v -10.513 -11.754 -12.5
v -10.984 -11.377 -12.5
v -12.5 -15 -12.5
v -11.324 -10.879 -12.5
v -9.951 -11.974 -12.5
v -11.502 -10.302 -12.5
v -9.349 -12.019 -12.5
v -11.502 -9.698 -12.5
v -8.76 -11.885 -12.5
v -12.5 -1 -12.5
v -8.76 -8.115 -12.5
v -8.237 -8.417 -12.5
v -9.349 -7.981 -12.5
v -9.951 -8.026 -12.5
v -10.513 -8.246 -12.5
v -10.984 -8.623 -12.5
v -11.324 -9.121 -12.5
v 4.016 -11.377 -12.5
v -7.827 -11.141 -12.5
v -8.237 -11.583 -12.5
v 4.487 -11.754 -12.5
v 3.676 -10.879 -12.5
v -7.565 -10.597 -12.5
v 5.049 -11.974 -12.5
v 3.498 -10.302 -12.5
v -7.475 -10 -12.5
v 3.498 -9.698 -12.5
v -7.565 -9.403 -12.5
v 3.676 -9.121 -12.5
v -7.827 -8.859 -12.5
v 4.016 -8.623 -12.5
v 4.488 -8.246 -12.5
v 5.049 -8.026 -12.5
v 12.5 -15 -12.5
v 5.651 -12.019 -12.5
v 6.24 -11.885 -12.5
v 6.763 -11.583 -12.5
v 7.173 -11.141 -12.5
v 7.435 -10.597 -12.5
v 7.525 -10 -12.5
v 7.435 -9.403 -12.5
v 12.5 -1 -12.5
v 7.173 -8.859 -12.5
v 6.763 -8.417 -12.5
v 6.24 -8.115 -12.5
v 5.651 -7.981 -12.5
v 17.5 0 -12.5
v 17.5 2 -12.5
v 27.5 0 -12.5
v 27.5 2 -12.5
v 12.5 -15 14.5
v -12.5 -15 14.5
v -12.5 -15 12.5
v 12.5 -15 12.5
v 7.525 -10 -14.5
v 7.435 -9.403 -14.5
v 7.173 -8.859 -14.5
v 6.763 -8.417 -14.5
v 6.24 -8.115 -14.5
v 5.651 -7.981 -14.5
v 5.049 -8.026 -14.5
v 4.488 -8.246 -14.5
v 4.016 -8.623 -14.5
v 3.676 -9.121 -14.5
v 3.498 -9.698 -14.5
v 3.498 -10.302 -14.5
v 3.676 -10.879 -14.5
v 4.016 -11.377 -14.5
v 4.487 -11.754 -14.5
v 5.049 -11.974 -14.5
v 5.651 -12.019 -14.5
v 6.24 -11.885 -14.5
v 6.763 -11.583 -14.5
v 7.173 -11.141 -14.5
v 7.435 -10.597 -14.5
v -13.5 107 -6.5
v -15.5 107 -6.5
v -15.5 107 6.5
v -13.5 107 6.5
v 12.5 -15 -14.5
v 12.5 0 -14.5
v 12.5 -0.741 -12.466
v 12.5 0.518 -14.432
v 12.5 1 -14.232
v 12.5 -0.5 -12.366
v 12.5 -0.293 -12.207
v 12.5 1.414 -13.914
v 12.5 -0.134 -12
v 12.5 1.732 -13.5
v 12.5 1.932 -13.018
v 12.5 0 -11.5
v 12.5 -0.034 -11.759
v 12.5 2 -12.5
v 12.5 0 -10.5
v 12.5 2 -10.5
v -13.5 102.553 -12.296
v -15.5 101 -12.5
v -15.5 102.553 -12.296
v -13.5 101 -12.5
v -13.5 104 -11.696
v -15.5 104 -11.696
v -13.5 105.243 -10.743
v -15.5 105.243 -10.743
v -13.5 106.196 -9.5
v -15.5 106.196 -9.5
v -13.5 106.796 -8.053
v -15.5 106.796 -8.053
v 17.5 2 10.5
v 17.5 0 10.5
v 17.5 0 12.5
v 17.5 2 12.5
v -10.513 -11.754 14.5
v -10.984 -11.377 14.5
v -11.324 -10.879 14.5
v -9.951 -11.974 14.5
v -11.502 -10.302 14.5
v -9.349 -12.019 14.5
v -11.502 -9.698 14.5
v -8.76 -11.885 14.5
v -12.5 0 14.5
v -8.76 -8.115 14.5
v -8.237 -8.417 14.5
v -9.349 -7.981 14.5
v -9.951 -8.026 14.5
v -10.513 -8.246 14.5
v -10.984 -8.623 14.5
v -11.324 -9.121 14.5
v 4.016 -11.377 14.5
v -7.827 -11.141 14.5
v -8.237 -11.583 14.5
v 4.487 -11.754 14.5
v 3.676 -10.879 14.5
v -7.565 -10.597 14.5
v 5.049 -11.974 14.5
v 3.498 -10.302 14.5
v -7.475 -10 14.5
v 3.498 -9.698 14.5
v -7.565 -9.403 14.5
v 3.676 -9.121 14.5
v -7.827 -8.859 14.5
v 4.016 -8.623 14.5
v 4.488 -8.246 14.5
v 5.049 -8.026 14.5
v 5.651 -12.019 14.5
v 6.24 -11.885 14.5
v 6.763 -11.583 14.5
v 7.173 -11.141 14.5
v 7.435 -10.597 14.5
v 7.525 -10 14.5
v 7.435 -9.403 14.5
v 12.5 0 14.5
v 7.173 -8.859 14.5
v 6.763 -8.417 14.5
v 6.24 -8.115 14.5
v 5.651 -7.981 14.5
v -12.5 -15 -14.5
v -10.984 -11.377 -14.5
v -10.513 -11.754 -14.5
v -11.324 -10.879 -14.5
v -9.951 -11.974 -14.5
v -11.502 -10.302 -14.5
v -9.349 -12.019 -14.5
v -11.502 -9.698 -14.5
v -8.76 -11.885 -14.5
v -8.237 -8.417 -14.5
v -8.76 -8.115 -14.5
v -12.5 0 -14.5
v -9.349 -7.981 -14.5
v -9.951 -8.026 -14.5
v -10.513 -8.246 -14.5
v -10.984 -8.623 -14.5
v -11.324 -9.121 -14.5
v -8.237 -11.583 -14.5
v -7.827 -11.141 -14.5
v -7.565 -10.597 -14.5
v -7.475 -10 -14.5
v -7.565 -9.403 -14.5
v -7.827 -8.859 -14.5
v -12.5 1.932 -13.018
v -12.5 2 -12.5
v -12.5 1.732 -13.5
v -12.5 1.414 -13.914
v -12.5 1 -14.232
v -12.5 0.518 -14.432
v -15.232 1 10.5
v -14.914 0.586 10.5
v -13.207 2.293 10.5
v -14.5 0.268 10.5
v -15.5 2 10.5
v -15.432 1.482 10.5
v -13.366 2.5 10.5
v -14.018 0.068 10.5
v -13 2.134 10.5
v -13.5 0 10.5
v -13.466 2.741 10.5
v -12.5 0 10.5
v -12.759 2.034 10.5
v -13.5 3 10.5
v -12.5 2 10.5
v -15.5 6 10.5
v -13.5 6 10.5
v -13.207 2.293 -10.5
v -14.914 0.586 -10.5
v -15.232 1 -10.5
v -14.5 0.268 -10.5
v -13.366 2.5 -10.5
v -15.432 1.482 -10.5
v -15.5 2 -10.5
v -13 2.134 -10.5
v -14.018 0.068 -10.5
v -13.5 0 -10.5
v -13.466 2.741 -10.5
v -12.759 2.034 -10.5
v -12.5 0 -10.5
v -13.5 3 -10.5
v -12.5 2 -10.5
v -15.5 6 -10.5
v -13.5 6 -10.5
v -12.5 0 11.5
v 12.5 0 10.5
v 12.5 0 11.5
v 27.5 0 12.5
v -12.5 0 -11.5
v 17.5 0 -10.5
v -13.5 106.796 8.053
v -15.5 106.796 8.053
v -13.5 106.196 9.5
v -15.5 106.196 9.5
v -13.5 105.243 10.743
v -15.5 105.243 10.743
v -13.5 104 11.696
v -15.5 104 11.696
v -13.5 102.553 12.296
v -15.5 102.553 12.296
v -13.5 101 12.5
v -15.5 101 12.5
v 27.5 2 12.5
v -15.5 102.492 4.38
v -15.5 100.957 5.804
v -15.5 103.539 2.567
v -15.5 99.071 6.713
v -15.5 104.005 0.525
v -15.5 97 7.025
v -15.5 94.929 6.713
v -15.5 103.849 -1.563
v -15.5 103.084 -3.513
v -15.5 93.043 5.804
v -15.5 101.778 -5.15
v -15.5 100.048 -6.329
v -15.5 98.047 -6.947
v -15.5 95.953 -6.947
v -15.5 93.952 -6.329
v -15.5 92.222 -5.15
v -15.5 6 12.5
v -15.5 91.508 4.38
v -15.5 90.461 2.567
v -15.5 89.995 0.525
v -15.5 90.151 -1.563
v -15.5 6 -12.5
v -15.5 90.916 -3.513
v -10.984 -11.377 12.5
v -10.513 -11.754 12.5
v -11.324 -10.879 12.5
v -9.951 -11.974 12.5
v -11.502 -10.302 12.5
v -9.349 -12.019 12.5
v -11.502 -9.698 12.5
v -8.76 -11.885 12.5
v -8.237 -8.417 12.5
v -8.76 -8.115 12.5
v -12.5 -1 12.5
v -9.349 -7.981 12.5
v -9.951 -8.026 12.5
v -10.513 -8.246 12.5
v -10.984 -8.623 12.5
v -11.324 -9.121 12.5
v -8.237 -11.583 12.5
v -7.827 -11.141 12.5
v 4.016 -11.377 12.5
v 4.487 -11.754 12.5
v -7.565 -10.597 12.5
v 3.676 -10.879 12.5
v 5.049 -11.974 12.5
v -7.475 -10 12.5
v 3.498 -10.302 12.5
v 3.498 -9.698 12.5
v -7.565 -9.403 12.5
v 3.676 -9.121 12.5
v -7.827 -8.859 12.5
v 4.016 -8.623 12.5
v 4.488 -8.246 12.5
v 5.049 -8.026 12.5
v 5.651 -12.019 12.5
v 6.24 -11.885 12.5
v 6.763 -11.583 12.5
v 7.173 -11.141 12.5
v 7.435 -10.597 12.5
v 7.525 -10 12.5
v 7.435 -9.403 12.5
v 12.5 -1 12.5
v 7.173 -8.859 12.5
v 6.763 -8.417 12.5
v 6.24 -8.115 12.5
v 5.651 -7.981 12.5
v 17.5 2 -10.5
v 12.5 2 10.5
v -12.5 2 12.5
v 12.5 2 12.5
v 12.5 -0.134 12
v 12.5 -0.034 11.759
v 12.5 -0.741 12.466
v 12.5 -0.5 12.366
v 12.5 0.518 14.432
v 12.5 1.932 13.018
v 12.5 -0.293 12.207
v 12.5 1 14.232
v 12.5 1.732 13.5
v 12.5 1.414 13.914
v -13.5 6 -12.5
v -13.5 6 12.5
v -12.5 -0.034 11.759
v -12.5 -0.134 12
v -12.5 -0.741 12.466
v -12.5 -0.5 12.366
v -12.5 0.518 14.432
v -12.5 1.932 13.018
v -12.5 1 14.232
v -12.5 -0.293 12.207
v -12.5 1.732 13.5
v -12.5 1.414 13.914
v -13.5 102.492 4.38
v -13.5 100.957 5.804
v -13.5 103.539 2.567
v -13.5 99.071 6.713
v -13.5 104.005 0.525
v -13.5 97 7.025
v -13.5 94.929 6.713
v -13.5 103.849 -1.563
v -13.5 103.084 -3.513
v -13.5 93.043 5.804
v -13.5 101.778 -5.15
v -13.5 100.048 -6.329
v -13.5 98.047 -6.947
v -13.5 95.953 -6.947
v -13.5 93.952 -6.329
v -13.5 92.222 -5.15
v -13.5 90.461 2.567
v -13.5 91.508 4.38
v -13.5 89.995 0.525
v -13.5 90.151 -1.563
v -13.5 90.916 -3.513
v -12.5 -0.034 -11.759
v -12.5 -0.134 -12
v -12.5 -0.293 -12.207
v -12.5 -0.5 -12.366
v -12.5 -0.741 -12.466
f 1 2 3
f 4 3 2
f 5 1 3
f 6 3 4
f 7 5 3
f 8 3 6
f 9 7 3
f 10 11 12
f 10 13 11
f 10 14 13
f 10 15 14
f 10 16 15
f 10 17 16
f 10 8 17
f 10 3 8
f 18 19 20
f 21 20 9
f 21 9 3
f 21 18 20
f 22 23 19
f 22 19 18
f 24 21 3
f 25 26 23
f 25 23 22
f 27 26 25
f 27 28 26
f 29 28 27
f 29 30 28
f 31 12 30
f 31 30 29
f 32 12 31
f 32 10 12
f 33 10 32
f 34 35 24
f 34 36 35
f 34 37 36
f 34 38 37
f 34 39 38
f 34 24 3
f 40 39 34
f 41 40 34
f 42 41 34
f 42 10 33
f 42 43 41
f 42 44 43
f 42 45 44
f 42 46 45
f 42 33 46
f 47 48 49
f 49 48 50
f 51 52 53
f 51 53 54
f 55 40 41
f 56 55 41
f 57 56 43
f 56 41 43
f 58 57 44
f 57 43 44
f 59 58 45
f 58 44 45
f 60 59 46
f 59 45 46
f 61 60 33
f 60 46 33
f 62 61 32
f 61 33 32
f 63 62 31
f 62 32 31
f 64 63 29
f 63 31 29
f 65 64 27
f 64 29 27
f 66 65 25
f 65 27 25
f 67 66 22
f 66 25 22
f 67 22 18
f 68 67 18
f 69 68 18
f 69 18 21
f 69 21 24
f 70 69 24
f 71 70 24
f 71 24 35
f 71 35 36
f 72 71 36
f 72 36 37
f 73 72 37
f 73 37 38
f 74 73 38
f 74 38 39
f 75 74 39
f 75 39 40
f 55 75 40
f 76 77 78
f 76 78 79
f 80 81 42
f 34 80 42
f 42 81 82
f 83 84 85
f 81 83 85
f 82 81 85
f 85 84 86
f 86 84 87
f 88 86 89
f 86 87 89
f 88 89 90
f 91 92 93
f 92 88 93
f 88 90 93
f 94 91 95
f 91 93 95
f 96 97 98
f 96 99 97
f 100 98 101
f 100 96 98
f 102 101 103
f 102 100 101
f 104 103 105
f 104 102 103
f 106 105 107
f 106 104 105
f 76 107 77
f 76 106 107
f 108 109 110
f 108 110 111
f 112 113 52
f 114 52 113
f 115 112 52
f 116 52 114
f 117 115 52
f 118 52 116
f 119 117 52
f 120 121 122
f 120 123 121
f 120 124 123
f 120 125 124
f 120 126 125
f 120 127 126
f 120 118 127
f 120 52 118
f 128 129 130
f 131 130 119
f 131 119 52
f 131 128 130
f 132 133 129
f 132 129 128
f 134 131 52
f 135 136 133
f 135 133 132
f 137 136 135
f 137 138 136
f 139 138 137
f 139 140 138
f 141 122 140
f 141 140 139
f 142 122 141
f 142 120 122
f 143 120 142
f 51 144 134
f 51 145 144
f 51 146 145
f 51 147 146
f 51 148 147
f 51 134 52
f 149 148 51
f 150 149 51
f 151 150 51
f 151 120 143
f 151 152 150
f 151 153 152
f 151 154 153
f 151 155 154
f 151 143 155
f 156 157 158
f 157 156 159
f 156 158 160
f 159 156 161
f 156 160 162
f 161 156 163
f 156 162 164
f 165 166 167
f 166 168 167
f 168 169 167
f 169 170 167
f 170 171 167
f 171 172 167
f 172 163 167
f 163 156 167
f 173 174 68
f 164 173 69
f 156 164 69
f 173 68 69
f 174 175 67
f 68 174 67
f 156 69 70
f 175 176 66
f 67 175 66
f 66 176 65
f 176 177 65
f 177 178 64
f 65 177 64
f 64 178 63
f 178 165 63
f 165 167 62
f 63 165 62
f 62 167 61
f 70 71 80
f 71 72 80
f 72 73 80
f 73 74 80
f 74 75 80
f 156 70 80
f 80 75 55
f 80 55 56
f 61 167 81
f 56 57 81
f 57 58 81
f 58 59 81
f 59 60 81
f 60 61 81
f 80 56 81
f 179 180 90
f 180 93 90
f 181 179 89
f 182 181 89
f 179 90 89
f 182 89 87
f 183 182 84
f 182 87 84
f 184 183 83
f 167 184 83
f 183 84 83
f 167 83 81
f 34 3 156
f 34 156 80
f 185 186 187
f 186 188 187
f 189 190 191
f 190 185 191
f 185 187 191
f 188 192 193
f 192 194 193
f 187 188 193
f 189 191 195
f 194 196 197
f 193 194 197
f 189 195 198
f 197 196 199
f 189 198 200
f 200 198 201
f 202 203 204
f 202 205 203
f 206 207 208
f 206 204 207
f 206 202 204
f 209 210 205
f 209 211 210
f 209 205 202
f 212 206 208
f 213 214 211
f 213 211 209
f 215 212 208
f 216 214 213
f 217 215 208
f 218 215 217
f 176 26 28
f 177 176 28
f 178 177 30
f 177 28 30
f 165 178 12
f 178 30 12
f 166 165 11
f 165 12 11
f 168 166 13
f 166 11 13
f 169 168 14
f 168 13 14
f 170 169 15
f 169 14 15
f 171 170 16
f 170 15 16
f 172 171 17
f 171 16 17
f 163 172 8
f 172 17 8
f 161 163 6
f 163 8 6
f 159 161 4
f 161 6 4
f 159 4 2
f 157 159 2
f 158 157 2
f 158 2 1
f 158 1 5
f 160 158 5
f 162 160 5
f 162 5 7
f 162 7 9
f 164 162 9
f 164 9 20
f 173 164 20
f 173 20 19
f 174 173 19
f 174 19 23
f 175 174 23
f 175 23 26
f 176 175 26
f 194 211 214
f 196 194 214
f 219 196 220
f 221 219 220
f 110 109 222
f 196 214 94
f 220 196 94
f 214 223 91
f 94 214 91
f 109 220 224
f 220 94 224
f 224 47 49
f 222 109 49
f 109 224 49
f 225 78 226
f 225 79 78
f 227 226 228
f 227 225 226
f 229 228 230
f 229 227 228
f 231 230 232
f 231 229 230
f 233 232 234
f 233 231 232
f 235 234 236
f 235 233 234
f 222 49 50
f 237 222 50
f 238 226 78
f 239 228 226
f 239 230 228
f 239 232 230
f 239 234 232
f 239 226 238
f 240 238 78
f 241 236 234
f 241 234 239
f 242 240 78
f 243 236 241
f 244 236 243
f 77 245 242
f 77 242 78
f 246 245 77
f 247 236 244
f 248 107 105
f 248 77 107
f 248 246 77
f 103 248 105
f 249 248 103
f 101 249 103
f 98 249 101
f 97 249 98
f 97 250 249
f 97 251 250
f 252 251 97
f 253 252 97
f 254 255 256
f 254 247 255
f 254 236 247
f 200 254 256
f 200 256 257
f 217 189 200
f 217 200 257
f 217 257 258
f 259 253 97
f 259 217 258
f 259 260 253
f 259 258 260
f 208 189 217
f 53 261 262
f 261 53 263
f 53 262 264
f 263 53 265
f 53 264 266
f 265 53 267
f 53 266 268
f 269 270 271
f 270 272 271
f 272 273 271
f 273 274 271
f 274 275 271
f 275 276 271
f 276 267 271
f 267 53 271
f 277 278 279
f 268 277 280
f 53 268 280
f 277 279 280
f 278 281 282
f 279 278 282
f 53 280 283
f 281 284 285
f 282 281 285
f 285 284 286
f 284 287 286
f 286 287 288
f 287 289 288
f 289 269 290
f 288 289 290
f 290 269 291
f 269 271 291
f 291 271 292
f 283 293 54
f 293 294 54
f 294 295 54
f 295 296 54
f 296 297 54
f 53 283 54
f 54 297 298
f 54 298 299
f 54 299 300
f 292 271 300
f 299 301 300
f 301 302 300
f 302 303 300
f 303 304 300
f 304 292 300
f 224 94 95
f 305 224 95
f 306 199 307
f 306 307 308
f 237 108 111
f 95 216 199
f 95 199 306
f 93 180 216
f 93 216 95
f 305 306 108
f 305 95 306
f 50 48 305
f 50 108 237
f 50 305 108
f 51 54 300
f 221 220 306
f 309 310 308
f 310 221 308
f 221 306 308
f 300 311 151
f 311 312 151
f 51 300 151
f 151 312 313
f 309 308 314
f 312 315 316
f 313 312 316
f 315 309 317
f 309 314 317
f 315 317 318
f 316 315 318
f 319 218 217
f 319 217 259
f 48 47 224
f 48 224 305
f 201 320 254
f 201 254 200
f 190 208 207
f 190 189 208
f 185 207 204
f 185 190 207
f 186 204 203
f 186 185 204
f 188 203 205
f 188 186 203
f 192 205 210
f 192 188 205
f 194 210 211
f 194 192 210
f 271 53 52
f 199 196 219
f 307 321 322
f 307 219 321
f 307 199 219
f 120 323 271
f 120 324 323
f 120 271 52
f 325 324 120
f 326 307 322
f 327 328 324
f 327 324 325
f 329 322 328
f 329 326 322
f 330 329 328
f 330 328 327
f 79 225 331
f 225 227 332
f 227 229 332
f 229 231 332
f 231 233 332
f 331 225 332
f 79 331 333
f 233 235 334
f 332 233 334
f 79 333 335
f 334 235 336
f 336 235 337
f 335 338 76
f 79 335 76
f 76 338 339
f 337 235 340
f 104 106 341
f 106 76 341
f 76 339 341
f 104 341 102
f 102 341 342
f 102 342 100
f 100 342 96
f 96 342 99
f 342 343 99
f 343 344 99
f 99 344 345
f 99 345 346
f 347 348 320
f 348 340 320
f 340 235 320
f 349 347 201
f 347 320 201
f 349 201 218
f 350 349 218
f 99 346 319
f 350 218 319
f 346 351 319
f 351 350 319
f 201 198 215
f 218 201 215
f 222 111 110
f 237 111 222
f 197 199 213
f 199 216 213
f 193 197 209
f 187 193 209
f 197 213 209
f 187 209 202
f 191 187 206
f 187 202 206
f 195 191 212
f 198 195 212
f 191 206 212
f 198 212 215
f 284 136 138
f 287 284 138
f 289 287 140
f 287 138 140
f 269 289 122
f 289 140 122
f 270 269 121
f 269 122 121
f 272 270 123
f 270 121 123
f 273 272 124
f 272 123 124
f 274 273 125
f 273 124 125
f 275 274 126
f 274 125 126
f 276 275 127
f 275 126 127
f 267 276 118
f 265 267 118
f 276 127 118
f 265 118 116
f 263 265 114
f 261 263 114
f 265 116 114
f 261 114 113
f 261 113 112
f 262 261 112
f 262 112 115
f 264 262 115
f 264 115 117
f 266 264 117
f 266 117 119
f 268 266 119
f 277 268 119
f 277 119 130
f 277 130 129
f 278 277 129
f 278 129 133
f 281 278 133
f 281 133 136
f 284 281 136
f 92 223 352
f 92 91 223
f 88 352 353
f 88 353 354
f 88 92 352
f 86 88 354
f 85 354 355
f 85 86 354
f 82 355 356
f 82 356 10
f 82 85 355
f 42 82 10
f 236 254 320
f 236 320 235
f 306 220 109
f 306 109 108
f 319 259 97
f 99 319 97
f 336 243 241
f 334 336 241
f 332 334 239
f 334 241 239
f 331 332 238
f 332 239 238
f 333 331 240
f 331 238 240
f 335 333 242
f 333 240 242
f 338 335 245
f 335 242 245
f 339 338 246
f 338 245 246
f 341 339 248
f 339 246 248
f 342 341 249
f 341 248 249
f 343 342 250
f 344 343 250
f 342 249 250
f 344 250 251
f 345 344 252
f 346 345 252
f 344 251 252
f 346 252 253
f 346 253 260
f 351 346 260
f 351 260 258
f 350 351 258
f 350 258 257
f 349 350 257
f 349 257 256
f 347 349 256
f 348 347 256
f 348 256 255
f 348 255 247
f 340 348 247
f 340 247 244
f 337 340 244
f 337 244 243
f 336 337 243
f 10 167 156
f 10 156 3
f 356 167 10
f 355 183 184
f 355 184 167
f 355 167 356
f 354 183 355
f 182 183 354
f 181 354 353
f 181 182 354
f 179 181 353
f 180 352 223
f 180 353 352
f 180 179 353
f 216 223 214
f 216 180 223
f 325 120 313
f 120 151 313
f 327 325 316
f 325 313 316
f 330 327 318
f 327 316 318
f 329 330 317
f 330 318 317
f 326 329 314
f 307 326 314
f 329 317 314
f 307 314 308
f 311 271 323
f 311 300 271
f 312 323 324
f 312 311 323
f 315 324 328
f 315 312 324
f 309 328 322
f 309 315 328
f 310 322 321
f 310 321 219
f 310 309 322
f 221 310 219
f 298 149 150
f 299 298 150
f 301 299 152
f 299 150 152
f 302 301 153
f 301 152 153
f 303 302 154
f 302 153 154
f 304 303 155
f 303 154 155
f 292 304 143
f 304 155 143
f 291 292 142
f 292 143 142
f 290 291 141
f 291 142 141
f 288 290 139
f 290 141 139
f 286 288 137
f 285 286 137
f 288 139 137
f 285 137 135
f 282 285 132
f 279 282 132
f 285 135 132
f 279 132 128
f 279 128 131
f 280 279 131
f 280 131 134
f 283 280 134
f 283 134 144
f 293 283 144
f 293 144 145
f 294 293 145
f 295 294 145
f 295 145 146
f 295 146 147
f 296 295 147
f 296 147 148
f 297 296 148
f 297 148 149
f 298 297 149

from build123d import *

# Parameters (mm, degrees)
SKETCH1_W                = 25
SKETCH1_H                = 25
BOSS_EXTRUDE1_DEPTH      = 2
BOSS_EXTRUDE2_DEPTH      = 15
BOSS_EXTRUDE2_DEPTH_BACK = 2
SKETCH2_W                = 25
SKETCH2_H                = 2
SKETCH3_R                = 2.025
CUT_EXTRUDE1_DEPTH       = 35.960692213
FILLET1_R                = 2
FILLET2_R                = 1
SKETCH4_W                = 21
SKETCH4_H                = 2
BOSS_EXTRUDE3_DEPTH      = 3
SKETCH5_W                = 21
SKETCH5_H                = 2
BOSS_EXTRUDE4_DEPTH      = 15
BOSS_EXTRUDE5_DEPTH      = 15
BOSS_EXTRUDE5_DEPTH_BACK = 36
SKETCH6_W                = 10
SKETCH6_H                = 2
SKETCH7_W                = 2
SKETCH7_H                = 41
BOSS_EXTRUDE6_DEPTH      = 105
SKETCH8_W                = 10
SKETCH8_H                = 4
CUT_EXTRUDE2_DEPTH       = 118.389309564
FILLET3_R                = 1
FILLET4_R                = 2
SKETCH12_R               = 7.025
CUT_EXTRUDE4_DEPTH       = 119.102709537
CUT_EXTRUDE5_DEPTH       = 119.102709537
FILLET7_R                = 6
FILLET8_R                = 6
SKETCH14_W               = 10
SKETCH14_H               = 5
CUT_EXTRUDE6_DEPTH       = 112.496636721
SKETCH15_W               = 15
SKETCH15_H               = 54
CUT_EXTRUDE7_DEPTH       = 117.405541105
SKETCH16_W               = 10
SKETCH16_H               = 8
CUT_EXTRUDE8_DEPTH       = 10


with BuildPart() as part:
    # Sketch1 → Boss-Extrude1 (new body)
    with BuildSketch(Plane(origin=(0, 0, 0), x_dir=(1, 0, 0), z_dir=(0, 1, 0))):
        Rectangle(SKETCH1_W, SKETCH1_H)
    extrude(amount=BOSS_EXTRUDE1_DEPTH)

    # Sketch2 → Boss-Extrude2 (add, two sides: drawn at the far end of the back side and taken through both)
    with BuildSketch(Plane.XZ.offset(-BOSS_EXTRUDE2_DEPTH_BACK)):
        with Locations((0, 13.5)):
            Rectangle(SKETCH2_W, SKETCH2_H)
        with Locations((0, -13.5)):
            Rectangle(SKETCH2_W, SKETCH2_H)
    extrude(amount=BOSS_EXTRUDE2_DEPTH + BOSS_EXTRUDE2_DEPTH_BACK)

    # Sketch3 → Cut-Extrude1 (cut, through all)
    with BuildSketch(Plane.XY.offset(14.5)):
        with Locations((-9.5, -10)):
            Circle(SKETCH3_R)
        with Locations((5.5, -10)):
            Circle(SKETCH3_R)
    extrude(amount=-CUT_EXTRUDE1_DEPTH, mode=Mode.SUBTRACT)

    # Fillet1
    fillet1_edges = [part.edges().sort_by_distance(p)[0] for p in [
        (0, 2, 14.5),
        (0, 2, -14.5),
    ]]
    fillet(fillet1_edges, radius=FILLET1_R)

    # Fillet2
    fillet2_edges = [part.edges().sort_by_distance(p)[0] for p in [
        (0, 0, 12.5),
        (0, 0, -12.5),
    ]]
    fillet(fillet2_edges, radius=FILLET2_R)

    # Sketch4 → Boss-Extrude3 (add)
    with BuildSketch(Plane.ZY.offset(12.5)):
        with Locations((0, 1)):
            Rectangle(SKETCH4_W, SKETCH4_H)
    extrude(amount=BOSS_EXTRUDE3_DEPTH)

    # Sketch5 → Boss-Extrude4 (add)
    with BuildSketch(Plane(origin=(12.5, 0, 0), x_dir=(0, 0, -1), z_dir=(1, 0, 0))):
        with Locations((0, 1)):
            Rectangle(SKETCH5_W, SKETCH5_H)
    extrude(amount=BOSS_EXTRUDE4_DEPTH)

    # Sketch6 → Boss-Extrude5 (add, two sides: drawn at the far end of the back side and taken through both)
    with BuildSketch(Plane.XY.offset(10.5).offset(-BOSS_EXTRUDE5_DEPTH_BACK)):
        with Locations((22.5, 1)):
            Rectangle(SKETCH6_W, SKETCH6_H)
    extrude(amount=BOSS_EXTRUDE5_DEPTH + BOSS_EXTRUDE5_DEPTH_BACK)

    # Sketch7 → Boss-Extrude6 (add)
    with BuildSketch(Plane(origin=(0, 2, 0), x_dir=(1, 0, 0), z_dir=(0, 1, 0))):
        with Locations((-14.5, 0)):
            Rectangle(SKETCH7_W, SKETCH7_H)
    extrude(amount=BOSS_EXTRUDE6_DEPTH)

    # Sketch8 → Cut-Extrude2 (cut, through all)
    with BuildSketch(Plane(origin=(-13.5, 0, 0), x_dir=(0, 0, -1), z_dir=(1, 0, 0))):
        with Locations((-15.5, 4)):
            Rectangle(SKETCH8_W, SKETCH8_H)
        with Locations((15.5, 4)):
            Rectangle(SKETCH8_W, SKETCH8_H)
    extrude(amount=-CUT_EXTRUDE2_DEPTH, mode=Mode.SUBTRACT)

    # Fillet3
    fillet3_edges = [part.edges().sort_by_distance(p)[0] for p in [
        (-13.5, 2, 0),
    ]]
    fillet(fillet3_edges, radius=FILLET3_R)

    # Fillet4
    fillet4_edges = [part.edges().sort_by_distance(p)[0] for p in [
        (-15.5, 0, 0),
    ]]
    fillet(fillet4_edges, radius=FILLET4_R)

    # Sketch12 → Cut-Extrude4 (cut, through all)
    with BuildSketch(Plane.ZY.offset(15.5)):
        with Locations((0, 97)):
            Circle(SKETCH12_R)
    extrude(amount=-CUT_EXTRUDE4_DEPTH, mode=Mode.SUBTRACT)

    # Sketch13 → Cut-Extrude5 (cut, through all)
    with BuildSketch(Plane.ZY.offset(15.5)):
        Polygon((-20.5, 107), (-20.5, 52), (-12.5, 60), (-12.5, 107), align=None)
        Polygon((12.5, 60), (12.5, 107), (20.5, 107), (20.5, 52), align=None)
    extrude(amount=-CUT_EXTRUDE5_DEPTH, mode=Mode.SUBTRACT)

    # Fillet7
    fillet7_edges = [part.edges().sort_by_distance(p)[0] for p in [
        (-14.5, 107, 12.5),
        (-14.5, 107, -12.5),
    ]]
    fillet(fillet7_edges, radius=FILLET7_R)

    # Fillet8
    fillet8_edges = [part.edges().sort_by_distance(p)[0] for p in [
        (-14.5, 6, 20.5),
        (-14.5, 6, -20.5),
    ]]
    fillet(fillet8_edges, radius=FILLET8_R)

    # Sketch14 → Cut-Extrude6 (cut, through all)
    with BuildSketch(Plane(origin=(0, 2, 0), x_dir=(1, 0, 0), z_dir=(0, 1, 0))):
        with Locations((22.5, 23)):
            Rectangle(SKETCH14_W, SKETCH14_H)
        with Locations((22.5, -23)):
            Rectangle(SKETCH14_W, SKETCH14_H)
    extrude(amount=-CUT_EXTRUDE6_DEPTH, mode=Mode.SUBTRACT)

    # Sketch15 → Cut-Extrude7 (cut, through all)
    with BuildSketch(Plane(origin=(-13.5, 0, 0), x_dir=(0, 0, -1), z_dir=(1, 0, 0))):
        with Locations((-20, 33)):
            Rectangle(SKETCH15_W, SKETCH15_H)
        with Locations((20, 33)):
            Rectangle(SKETCH15_W, SKETCH15_H)
    extrude(amount=-CUT_EXTRUDE7_DEPTH, mode=Mode.SUBTRACT)

    # Sketch16 → Cut-Extrude8 (cut)
    with BuildSketch(Plane(origin=(0, 2, 0), x_dir=(1, 0, 0), z_dir=(0, 1, 0))):
        with Locations((22.5, -16.5)):
            Rectangle(SKETCH16_W, SKETCH16_H)
        with Locations((22.5, 16.5)):
            Rectangle(SKETCH16_W, SKETCH16_H)
    extrude(amount=-CUT_EXTRUDE8_DEPTH, mode=Mode.SUBTRACT)


solid = part.part
